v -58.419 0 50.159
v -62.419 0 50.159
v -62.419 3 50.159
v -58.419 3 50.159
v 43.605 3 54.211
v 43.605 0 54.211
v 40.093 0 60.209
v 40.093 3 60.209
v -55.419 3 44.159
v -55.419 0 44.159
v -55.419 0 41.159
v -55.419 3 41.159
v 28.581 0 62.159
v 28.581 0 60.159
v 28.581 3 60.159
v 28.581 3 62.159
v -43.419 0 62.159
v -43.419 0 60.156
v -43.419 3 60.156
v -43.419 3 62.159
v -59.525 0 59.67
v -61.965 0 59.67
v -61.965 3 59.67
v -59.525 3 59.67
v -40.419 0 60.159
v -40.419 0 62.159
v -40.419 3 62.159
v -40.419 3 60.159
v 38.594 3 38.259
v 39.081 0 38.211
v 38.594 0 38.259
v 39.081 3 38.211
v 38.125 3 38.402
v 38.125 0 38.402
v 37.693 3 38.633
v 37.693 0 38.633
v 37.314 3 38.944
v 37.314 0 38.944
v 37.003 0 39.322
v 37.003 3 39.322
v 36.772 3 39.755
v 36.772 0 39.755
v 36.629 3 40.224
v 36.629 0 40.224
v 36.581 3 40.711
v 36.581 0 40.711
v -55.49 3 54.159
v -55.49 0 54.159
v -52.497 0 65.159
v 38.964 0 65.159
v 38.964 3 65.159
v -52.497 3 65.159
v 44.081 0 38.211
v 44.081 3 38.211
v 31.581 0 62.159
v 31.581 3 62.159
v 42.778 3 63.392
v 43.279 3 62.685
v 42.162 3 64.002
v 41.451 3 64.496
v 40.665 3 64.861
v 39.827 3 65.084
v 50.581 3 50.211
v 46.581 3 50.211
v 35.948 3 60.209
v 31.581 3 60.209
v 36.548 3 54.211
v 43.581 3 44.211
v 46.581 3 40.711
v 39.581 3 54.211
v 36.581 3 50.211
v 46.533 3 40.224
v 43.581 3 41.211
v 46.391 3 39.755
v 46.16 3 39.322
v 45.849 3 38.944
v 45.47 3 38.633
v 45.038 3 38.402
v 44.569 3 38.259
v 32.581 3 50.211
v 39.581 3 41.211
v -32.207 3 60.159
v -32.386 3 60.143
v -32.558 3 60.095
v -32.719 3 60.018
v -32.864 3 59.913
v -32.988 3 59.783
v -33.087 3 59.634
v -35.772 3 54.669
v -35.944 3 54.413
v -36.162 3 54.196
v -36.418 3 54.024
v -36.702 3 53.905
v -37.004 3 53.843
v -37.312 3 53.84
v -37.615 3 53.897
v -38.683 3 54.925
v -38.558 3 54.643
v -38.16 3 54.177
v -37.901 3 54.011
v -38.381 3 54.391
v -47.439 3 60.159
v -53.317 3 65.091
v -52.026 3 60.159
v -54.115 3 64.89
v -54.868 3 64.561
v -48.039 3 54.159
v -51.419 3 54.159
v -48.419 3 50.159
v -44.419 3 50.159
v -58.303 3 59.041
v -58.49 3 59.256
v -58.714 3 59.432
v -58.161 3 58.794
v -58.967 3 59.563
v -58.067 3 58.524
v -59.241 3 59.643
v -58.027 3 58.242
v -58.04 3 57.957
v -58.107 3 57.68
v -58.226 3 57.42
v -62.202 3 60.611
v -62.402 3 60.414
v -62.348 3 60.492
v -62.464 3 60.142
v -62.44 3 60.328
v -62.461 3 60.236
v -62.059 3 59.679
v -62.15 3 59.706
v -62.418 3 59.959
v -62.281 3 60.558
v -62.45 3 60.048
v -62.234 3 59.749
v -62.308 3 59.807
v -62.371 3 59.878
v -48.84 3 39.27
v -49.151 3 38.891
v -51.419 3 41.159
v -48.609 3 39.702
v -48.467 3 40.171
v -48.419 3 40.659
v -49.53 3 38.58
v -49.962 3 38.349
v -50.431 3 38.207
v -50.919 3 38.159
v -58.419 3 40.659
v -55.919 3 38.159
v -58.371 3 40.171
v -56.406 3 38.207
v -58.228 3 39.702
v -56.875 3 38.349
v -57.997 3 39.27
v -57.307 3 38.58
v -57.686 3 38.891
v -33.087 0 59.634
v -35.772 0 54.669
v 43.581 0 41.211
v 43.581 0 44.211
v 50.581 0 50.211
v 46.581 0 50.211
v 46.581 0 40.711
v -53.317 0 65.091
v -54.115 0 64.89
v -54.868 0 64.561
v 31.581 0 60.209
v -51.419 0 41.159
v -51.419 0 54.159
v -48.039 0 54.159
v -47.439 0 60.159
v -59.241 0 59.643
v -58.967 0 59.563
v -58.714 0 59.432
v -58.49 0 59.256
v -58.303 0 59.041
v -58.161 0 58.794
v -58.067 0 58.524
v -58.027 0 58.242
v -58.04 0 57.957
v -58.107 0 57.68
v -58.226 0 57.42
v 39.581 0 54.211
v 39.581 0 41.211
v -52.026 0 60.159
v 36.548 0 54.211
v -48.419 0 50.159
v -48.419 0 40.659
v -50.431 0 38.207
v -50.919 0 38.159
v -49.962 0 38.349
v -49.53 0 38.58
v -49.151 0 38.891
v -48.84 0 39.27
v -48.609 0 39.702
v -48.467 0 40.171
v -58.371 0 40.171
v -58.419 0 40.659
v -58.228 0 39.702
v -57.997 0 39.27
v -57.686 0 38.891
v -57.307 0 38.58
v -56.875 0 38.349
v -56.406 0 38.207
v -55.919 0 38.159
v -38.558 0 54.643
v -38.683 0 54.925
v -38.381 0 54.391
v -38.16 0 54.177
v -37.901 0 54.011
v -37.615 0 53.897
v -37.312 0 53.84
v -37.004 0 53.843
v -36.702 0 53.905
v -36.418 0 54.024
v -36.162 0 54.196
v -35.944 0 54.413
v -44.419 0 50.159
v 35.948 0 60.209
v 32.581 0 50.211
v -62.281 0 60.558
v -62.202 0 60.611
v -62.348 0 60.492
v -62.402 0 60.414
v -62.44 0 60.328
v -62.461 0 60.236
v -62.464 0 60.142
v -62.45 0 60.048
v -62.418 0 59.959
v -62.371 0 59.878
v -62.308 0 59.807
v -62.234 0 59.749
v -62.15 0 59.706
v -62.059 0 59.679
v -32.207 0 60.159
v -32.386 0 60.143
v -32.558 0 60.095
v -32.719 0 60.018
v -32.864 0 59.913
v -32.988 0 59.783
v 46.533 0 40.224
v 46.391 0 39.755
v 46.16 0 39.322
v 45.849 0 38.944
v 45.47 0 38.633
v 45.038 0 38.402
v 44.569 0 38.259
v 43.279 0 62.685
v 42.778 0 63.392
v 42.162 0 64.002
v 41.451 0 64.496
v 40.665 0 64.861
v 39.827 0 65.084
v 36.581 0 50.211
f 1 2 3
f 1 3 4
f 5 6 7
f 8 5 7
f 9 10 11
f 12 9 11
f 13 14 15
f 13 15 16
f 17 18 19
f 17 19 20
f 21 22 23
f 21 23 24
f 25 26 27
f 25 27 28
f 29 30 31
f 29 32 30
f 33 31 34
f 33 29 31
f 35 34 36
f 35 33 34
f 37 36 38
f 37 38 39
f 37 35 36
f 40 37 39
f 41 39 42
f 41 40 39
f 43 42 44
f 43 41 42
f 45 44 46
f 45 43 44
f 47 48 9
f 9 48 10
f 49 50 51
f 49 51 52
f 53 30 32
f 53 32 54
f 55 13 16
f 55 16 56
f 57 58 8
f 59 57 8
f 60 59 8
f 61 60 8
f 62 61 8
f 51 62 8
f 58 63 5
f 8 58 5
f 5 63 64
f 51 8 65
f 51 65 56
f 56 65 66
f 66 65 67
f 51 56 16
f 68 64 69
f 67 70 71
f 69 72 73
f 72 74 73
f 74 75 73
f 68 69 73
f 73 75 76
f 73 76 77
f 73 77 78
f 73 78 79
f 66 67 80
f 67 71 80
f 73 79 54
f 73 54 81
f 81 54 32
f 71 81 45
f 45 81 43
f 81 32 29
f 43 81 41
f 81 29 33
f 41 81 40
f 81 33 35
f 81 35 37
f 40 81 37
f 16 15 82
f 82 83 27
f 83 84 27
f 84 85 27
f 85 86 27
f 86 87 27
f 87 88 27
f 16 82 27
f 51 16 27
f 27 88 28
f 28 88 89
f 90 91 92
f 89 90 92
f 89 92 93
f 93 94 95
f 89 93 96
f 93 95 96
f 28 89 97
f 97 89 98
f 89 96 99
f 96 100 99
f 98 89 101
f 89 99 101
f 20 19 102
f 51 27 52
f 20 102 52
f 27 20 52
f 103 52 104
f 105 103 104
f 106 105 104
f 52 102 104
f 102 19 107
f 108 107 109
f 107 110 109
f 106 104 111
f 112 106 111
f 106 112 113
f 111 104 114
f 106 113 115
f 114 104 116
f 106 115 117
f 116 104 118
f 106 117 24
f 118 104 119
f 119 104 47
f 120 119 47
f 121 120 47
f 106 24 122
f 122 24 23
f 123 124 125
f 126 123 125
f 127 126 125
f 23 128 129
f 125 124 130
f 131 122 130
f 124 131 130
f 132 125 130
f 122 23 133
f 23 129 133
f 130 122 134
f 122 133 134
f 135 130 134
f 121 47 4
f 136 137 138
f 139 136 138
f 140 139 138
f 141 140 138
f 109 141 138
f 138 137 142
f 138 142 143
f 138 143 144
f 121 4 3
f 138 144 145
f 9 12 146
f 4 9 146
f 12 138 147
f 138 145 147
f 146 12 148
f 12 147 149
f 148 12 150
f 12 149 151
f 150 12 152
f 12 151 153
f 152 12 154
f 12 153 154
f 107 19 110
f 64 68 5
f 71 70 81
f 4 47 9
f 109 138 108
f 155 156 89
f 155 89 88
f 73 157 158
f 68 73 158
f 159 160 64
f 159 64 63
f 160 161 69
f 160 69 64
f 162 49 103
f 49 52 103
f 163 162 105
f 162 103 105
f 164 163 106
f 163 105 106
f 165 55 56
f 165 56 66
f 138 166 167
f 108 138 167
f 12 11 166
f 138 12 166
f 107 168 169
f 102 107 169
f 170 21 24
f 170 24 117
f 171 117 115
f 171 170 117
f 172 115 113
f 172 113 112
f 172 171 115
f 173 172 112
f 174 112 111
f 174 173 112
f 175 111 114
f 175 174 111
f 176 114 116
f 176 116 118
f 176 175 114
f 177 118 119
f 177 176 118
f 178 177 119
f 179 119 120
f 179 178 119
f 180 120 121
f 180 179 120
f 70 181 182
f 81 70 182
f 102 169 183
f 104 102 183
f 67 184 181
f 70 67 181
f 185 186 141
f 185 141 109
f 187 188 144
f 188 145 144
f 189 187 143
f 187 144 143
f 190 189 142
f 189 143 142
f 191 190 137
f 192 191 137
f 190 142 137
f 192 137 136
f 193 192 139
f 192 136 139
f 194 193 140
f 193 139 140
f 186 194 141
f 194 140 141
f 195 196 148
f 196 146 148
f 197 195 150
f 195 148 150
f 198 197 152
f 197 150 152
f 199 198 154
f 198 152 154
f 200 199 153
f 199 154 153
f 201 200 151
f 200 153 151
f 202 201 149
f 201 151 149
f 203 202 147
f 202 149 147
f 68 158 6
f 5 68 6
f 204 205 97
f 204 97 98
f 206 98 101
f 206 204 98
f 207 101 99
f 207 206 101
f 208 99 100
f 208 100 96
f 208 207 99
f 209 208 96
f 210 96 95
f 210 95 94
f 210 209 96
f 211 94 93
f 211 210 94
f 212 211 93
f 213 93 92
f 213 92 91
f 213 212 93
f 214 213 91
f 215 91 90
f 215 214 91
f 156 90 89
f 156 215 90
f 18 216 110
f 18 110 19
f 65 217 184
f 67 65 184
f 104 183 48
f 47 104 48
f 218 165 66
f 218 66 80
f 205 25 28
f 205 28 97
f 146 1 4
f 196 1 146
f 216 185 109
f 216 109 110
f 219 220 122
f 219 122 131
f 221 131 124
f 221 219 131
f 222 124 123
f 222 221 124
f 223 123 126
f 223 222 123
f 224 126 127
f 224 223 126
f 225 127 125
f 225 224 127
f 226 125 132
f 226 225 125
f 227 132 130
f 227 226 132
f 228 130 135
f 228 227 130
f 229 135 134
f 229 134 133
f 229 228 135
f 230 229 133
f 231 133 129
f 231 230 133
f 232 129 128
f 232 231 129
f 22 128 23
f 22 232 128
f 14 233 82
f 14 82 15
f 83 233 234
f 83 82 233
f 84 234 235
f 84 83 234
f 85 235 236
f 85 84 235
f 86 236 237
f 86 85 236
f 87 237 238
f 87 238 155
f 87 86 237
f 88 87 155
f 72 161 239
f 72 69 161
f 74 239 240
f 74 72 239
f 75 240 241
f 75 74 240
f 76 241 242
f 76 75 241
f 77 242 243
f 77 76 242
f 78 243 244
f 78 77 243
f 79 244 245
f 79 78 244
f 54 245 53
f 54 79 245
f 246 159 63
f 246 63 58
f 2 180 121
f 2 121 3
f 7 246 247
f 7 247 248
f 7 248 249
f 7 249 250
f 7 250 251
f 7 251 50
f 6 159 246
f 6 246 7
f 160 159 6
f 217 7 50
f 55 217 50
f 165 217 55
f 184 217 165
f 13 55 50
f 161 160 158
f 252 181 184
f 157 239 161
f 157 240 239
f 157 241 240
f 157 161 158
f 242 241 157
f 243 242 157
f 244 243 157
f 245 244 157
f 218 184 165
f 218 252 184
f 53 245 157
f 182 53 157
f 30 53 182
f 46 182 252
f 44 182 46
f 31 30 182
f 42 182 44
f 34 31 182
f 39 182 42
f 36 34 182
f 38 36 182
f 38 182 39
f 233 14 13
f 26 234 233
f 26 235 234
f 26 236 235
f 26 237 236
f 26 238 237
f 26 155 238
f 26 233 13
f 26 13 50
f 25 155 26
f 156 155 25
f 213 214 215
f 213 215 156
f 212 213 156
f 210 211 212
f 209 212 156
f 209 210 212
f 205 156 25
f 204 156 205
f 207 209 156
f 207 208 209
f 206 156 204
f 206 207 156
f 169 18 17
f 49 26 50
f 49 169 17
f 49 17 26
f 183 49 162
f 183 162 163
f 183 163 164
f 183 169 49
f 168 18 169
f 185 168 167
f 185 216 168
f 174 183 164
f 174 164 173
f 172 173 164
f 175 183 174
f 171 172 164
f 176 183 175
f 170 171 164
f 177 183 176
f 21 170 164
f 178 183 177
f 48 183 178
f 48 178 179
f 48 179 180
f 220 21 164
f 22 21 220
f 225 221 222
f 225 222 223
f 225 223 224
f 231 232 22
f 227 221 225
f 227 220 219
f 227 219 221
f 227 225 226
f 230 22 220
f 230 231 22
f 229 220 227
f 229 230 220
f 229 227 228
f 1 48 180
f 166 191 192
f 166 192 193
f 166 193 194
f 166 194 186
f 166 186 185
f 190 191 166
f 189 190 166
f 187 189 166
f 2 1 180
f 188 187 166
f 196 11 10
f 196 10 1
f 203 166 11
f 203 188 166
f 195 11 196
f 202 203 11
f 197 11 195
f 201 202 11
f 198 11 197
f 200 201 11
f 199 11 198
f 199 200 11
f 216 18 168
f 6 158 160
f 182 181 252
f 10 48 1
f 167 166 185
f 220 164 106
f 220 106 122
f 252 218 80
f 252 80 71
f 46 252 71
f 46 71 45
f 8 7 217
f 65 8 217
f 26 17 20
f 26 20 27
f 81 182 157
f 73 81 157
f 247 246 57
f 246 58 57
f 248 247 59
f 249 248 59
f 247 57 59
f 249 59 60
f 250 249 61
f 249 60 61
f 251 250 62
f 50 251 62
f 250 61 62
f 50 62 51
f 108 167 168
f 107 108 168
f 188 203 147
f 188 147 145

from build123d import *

# Parameters (mm, degrees)
BOSS_EXTRUDE1_DEPTH = 3
FILLET1_R           = 5
FILLET2_R           = 2.5
FILLET3_R           = 1


with BuildPart() as part:
    # Sketch1 → Boss-Extrude1 (new body)
    with BuildSketch(Plane(origin=(0, 0, 0), x_dir=(1, 0, 0), z_dir=(0, 1, 0))):
        with BuildLine():
            Line((-62.418566214, -50.1586621), (-58.418566214, -50.1586621))
            Line((-58.418566214, -50.1586621), (-58.418566214, -38.1586621))
            Line((-58.418566214, -38.1586621), (-48.418566214, -38.1586621))
            Line((-48.418566214, -38.1586621), (-48.418566214, -50.1586621))
            Line((-48.418566214, -50.1586621), (-44.418566214, -50.1586621))
            Line((-44.418566214, -50.1586621), (-43.418817081, -60.156153425))
            Line((-43.418817081, -60.156153425), (-43.418817081, -62.1586621))
            Line((-43.418817081, -62.1586621), (-40.418817081, -62.1586621))
            Line((-40.418817081, -62.1586621), (-40.418817081, -60.1586621))
            Line((-40.418817081, -60.1586621), (-38.682853905, -54.924562388))
            ThreePointArc((-38.682853905, -54.924562388), (-37.311808452, -53.840242209), (-35.772499384, -54.668519625))
            Line((-35.772499384, -54.668519625), (-32.803457275, -60.1586621))
            Line((-32.803457275, -60.1586621), (28.581433786, -60.1586621))
            Line((28.581433786, -60.1586621), (28.581433786, -62.1586621))
            Line((28.581433786, -62.1586621), (31.581433786, -62.1586621))
            Line((31.581433786, -62.1586621), (31.581433786, -60.208800497))
            Line((31.581433786, -60.208800497), (32.581433786, -50.211334262))
            Line((32.581433786, -50.211334262), (36.581433786, -50.211334262))
            Line((36.581433786, -50.211334262), (36.581433786, -38.211334262))
            Line((36.581433786, -38.211334262), (46.581433786, -38.211334262))
            Line((46.581433786, -38.211334262), (46.581433786, -50.211334262))
            Line((46.581433786, -50.211334262), (50.581433786, -50.211334262))
            Line((50.581433786, -50.211334262), (41.830582941, -65.1586621))
            Line((41.830582941, -65.1586621), (-53.758312176, -65.1586621))
            Line((-53.758312176, -65.1586621), (-62.202371167, -60.610709304))
            ThreePointArc((-62.202371167, -60.610709304), (-62.450096964, -60.048239346), (-61.965274707, -59.670498822))
            Line((-61.965274707, -59.670498822), (-59.524980934, -59.670498822))
            ThreePointArc((-59.524980934, -59.670498822), (-58.225942828, -58.920498822), (-58.225942828, -57.420498822))
            Line((-58.225942828, -57.420498822), (-62.418566214, -50.1586621))
        make_face()
        Polygon((36.547763078, -54.211334262), (39.581433786, -54.211334262), (39.581433786, -44.211334262), (39.581433786, -41.211334262), (43.581433786, -41.211334262), (43.581433786, -44.211334262), (43.604572315, -54.211334262), (40.093380681, -60.208800497), (35.947864455, -60.208800497), align=None, mode=Mode.SUBTRACT)
        Polygon((-55.418566214, -41.1586621), (-51.418566214, -41.1586621), (-51.418566214, -44.1586621), (-51.418566214, -54.1586621), (-48.038516462, -54.1586621), (-47.438516462, -60.1586621), (-52.026261368, -60.1586621), (-55.490362984, -54.1586621), (-55.418566214, -44.1586621), align=None, mode=Mode.SUBTRACT)
    extrude(amount=BOSS_EXTRUDE1_DEPTH)

    # Fillet1
    fillet1_edges = [part.edges().sort_by_distance(p)[0] for p in [
        (41.830582941, 1.5, 65.1586621),
        (-53.758312176, 1.5, 65.1586621),
    ]]
    fillet(fillet1_edges, radius=FILLET1_R)

    # Fillet2
    fillet2_edges = [part.edges().sort_by_distance(p)[0] for p in [
        (-58.418566214, 1.5, 38.1586621),
        (-48.418566214, 1.5, 38.1586621),
        (36.581433786, 1.5, 38.211334262),
        (46.581433786, 1.5, 38.211334262),
    ]]
    fillet(fillet2_edges, radius=FILLET2_R)

    # Fillet3
    fillet3_edges = [part.edges().sort_by_distance(p)[0] for p in [
        (-32.803457275, 1.5, 60.1586621),
    ]]
    fillet(fillet3_edges, radius=FILLET3_R)


solid = part.part
